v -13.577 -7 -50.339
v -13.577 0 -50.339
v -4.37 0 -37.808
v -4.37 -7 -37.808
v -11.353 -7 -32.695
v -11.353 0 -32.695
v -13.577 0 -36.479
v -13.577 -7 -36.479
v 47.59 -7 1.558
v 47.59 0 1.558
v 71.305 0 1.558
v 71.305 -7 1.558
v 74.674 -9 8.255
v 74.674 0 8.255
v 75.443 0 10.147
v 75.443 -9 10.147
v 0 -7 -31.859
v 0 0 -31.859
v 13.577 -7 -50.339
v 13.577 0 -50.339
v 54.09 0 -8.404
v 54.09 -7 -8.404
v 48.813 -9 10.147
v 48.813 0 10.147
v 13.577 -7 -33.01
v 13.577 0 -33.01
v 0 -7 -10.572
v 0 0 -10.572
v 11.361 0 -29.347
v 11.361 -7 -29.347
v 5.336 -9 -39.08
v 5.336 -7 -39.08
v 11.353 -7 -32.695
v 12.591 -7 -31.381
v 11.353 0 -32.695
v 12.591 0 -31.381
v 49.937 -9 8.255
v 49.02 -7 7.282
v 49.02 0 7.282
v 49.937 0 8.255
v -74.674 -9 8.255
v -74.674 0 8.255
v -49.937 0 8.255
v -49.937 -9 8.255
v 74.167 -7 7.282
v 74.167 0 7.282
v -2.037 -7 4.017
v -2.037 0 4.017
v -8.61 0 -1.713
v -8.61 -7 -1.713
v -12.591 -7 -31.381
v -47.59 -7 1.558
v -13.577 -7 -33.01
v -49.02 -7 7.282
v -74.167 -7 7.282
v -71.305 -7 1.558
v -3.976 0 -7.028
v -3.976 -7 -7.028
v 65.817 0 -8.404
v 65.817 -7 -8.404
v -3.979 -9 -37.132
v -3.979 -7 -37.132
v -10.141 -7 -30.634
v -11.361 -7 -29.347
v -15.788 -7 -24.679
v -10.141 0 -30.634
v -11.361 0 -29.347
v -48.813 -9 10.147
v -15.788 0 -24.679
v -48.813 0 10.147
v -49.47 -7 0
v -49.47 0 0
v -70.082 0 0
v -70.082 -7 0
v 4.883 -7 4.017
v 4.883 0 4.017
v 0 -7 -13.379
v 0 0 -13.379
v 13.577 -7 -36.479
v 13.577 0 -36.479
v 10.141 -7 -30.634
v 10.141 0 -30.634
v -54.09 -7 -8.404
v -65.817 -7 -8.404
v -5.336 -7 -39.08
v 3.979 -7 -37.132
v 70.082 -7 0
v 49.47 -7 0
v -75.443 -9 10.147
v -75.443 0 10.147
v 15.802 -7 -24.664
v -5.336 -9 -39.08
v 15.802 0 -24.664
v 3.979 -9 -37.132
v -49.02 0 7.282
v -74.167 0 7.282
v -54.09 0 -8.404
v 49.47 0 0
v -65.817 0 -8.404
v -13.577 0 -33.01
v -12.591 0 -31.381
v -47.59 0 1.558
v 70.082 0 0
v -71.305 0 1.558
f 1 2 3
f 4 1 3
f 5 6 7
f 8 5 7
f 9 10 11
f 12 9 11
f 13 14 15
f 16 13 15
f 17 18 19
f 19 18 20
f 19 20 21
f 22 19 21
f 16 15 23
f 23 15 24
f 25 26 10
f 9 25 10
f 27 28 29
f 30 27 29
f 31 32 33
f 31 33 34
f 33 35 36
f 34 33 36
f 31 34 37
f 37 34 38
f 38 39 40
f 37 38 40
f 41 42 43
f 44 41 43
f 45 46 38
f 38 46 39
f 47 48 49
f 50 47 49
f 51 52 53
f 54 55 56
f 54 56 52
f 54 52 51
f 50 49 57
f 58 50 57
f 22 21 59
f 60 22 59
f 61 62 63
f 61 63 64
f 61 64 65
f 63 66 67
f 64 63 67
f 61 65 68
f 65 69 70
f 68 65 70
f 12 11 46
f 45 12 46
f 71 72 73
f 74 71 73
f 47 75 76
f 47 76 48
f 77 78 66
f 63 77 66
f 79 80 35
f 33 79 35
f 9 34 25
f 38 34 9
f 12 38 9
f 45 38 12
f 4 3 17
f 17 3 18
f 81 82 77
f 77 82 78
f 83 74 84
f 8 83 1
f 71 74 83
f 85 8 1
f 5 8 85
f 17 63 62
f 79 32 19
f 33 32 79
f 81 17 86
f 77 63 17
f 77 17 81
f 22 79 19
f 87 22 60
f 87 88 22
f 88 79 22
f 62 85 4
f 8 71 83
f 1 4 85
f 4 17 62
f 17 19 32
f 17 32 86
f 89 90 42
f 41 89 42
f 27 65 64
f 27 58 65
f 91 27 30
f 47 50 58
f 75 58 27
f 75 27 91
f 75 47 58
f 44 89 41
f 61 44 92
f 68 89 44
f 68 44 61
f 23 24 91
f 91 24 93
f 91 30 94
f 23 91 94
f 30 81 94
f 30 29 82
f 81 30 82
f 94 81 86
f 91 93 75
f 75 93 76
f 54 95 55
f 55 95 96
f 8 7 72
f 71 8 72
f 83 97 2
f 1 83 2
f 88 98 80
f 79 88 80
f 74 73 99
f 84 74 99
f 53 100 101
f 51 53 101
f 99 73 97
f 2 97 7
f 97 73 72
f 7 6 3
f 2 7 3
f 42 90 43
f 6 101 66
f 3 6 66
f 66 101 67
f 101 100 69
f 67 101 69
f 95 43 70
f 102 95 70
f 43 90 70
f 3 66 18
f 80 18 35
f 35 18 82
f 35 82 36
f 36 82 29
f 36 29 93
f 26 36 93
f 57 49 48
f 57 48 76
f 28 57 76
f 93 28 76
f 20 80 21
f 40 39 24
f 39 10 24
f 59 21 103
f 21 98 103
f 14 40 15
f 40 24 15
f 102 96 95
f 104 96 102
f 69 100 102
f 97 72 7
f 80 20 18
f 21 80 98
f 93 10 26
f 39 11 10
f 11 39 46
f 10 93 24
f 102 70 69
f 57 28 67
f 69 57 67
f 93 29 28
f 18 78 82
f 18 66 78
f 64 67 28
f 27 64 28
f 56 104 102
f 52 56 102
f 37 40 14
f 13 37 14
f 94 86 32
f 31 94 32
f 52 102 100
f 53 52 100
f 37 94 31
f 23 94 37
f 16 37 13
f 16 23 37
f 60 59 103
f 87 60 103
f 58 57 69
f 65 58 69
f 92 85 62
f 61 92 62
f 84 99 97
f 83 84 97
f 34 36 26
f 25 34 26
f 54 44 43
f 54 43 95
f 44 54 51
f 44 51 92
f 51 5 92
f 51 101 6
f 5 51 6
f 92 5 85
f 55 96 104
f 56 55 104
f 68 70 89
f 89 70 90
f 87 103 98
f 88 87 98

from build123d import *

# Parameters (mm, degrees)
F2_DEPTH = 9
F3_DEPTH = 7


with BuildPart() as f2:
    # F1 (on Front) → F2 (new body)
    with BuildSketch(Plane.XZ):
        Polygon((-75.443379581, 10.1466504857), (-74.6737569571, 8.2548242062), (-49.936760217, 8.2548242062), (-5.3362287581, -39.0802323818), (-3.9785234258, -37.1320582926), (-48.8134101033, 10.1466504857), align=None)
    extrude(amount=F2_DEPTH)



with BuildPart() as f2b:
    # F1 (on Front) → F2, piece 2 (new body)
    with BuildSketch(Plane.XZ):
        Polygon((75.443379581, 10.1466504857), (48.8134101033, 10.1466504857), (3.9785234258, -37.1320582926), (5.3362287581, -39.0802323818), (49.936760217, 8.2548242062), (74.6737569571, 8.2548242062), align=None)
    extrude(amount=F2_DEPTH)


with BuildPart() as f2_1:
    add(f2.part)

    add(f2b.part)  # F3 merges F2b
    # F0 (on Front) → F3 (join)
    with BuildSketch(Plane.XZ):
        Polygon((-74.166752398, 7.2823497467), (-71.30458951, 1.5580287436), (-47.5895479321, 1.5580287436), (-13.5767729953, -33.0098701724), (0, -10.5720795691), (13.5767729953, -33.0098701724), (47.5895479321, 1.5580287436), (71.30458951, 1.5580287436), (74.166752398, 7.2823497467), (46.3629066944, 7.2823497467), (15.8331952989, -24.7465875), (4.8833945766, 4.0167045015), (-2.0373270524, 4.0167045015), (-8.6096497253, -1.7130117631), (-3.9756768383, -7.0284521207), (-15.8331952989, -24.7465875), (-46.3629066944, 7.2823497467), align=None)
        Polygon((13.5767729953, -36.478985101), (0, -13.3794201538), (-13.5767729953, -36.478985101), (-49.4699440897, 0), (-70.081859827, 0), (-65.8173263073, -8.4041291848), (-54.0898554027, -8.4041291848), (-13.5767729953, -50.3387264907), (-6.7883864976, -41.0989001393), (-4.3703924554, -37.8077137762), (0, -31.8590737879), (13.5767729953, -50.3387264907), (54.0898554027, -8.4041291848), (65.8173263073, -8.4041291848), (70.081859827, 0), (49.4699440897, 0), align=None)
    extrude(amount=F3_DEPTH)


solid = f2_1.part
